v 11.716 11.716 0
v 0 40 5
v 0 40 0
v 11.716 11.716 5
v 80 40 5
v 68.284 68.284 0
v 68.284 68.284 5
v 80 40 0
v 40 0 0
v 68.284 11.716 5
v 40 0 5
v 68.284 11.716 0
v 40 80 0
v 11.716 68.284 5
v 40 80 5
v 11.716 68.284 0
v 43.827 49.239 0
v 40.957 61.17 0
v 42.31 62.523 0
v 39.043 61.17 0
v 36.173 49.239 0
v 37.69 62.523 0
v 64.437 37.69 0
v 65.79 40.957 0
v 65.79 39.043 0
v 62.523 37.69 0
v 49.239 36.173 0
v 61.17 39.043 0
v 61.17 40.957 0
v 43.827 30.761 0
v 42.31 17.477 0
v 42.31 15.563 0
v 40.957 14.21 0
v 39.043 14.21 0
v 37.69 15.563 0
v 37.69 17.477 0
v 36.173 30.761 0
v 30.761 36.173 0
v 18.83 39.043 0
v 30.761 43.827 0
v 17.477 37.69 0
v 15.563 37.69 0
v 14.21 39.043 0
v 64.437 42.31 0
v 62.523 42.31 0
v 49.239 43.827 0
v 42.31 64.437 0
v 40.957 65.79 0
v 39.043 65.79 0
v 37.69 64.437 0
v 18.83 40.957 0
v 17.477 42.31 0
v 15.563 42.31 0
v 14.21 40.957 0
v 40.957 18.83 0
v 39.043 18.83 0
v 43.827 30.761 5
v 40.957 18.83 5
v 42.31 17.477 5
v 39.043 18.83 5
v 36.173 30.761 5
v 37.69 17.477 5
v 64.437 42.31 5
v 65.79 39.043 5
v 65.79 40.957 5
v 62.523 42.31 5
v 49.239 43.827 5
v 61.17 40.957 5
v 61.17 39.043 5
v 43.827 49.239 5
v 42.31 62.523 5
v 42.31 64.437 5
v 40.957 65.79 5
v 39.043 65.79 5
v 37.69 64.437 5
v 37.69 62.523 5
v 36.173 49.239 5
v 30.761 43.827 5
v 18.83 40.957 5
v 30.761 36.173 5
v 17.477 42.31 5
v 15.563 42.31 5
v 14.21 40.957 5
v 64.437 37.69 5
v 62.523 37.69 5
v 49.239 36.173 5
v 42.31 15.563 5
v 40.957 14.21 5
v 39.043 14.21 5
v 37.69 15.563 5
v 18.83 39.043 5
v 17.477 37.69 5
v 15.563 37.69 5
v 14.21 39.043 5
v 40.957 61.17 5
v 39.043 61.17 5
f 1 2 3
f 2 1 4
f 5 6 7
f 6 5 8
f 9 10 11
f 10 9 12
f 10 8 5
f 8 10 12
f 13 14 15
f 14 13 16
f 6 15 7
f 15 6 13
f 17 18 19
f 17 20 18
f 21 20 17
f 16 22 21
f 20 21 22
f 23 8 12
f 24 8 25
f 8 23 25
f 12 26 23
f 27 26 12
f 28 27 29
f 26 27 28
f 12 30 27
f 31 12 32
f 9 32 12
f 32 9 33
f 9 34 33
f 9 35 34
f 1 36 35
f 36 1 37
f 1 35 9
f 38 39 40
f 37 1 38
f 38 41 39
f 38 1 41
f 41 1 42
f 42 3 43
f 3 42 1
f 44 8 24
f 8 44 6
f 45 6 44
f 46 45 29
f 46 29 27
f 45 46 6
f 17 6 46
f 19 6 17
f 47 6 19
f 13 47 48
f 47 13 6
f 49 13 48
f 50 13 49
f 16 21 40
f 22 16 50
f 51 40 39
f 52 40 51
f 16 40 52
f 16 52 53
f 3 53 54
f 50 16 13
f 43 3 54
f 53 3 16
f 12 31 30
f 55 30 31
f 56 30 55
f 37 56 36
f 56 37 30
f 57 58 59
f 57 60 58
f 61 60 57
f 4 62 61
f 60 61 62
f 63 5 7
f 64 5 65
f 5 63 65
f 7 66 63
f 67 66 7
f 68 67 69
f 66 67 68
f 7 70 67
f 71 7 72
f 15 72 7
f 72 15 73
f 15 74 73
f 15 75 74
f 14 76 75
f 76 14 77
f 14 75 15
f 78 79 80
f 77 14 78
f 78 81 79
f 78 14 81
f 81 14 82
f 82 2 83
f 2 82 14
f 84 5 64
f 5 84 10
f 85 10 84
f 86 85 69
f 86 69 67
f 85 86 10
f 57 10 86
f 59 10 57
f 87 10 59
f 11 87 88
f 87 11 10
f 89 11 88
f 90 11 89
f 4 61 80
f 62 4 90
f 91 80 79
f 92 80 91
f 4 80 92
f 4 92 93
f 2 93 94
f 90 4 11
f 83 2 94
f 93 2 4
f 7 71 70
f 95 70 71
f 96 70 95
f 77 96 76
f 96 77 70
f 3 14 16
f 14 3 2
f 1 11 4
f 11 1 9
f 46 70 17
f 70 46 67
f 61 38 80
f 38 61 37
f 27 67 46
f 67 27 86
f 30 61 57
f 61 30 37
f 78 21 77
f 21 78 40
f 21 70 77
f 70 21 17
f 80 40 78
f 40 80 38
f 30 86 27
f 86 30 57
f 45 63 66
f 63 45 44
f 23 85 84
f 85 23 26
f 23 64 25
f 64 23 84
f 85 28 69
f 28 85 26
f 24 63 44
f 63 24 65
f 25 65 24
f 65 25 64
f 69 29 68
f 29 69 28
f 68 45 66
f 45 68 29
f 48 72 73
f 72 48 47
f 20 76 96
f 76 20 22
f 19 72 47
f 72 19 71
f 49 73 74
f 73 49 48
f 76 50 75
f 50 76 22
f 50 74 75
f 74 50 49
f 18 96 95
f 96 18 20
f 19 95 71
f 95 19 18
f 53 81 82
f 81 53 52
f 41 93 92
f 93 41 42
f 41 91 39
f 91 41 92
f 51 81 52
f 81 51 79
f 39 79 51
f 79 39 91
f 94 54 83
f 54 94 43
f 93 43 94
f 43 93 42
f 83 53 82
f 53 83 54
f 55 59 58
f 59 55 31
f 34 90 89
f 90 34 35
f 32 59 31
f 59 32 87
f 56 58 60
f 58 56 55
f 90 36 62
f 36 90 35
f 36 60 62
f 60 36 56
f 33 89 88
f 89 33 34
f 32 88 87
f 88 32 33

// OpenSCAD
$fn = 32;

// ----------------------------------------------------------------------
// Polygon plate: 8-gon R40, 4 bolt windows
// ----------------------------------------------------------------------

// --- parameters (mm) ---
sides = 8;                // number of polygon sides
plate_r = 40;             // circumscribed radius of the polygon
bore_r = 10;              // centre bore radius
bolts = 4;                // number of bolt windows
ring_r = 23.48;           // bolt-circle radius
bolt_r = 2.5;             // bolt window radius
plate_t = 5;              // plate thickness, Z (extrusion height)

plate_d = 2 * plate_r;  // circumscribed diameter
bore_d = 2 * bore_r;  // centre bore diameter
bolt_d = 2 * bolt_r;  // bolt window diameter
ring_d = 2 * ring_r;  // bolt-circle diameter

profile = [[80, 40], [68.284, 68.284], [40, 80], [11.716, 68.284], [0, 40], [11.716, 11.716], [40, 0], [68.284, 11.716]];  // primary outline, 8 points, counter clockwise
void_1 = [[49.239, 43.827], [43.827, 49.239], [36.173, 49.239], [30.761, 43.827], [30.761, 36.173], [36.173, 30.761], [43.827, 30.761], [49.239, 36.173]];  // centre bore, 8 points
void_2 = [[65.79, 40.957], [64.437, 42.31], [62.523, 42.31], [61.17, 40.957], [61.17, 39.043], [62.523, 37.69], [64.437, 37.69], [65.79, 39.043]];  // bolt window 1, 8 points
void_3 = [[42.31, 64.437], [40.957, 65.79], [39.043, 65.79], [37.69, 64.437], [37.69, 62.523], [39.043, 61.17], [40.957, 61.17], [42.31, 62.523]];  // bolt window 2, 8 points
void_4 = [[18.83, 40.957], [17.477, 42.31], [15.563, 42.31], [14.21, 40.957], [14.21, 39.043], [15.563, 37.69], [17.477, 37.69], [18.83, 39.043]];  // bolt window 3, 8 points
void_5 = [[42.31, 17.477], [40.957, 18.83], [39.043, 18.83], [37.69, 17.477], [37.69, 15.563], [39.043, 14.21], [40.957, 14.21], [42.31, 15.563]];  // bolt window 4, 8 points

// --- the one profile operation ---
difference() {
  linear_extrude(height = plate_t) polygon(points = profile);
  translate([0, 0, -1])
    linear_extrude(height = plate_t + 2) polygon(points = void_1);
  translate([0, 0, -1])
    linear_extrude(height = plate_t + 2) polygon(points = void_2);
  translate([0, 0, -1])
    linear_extrude(height = plate_t + 2) polygon(points = void_3);
  translate([0, 0, -1])
    linear_extrude(height = plate_t + 2) polygon(points = void_4);
  translate([0, 0, -1])
    linear_extrude(height = plate_t + 2) polygon(points = void_5);
}
